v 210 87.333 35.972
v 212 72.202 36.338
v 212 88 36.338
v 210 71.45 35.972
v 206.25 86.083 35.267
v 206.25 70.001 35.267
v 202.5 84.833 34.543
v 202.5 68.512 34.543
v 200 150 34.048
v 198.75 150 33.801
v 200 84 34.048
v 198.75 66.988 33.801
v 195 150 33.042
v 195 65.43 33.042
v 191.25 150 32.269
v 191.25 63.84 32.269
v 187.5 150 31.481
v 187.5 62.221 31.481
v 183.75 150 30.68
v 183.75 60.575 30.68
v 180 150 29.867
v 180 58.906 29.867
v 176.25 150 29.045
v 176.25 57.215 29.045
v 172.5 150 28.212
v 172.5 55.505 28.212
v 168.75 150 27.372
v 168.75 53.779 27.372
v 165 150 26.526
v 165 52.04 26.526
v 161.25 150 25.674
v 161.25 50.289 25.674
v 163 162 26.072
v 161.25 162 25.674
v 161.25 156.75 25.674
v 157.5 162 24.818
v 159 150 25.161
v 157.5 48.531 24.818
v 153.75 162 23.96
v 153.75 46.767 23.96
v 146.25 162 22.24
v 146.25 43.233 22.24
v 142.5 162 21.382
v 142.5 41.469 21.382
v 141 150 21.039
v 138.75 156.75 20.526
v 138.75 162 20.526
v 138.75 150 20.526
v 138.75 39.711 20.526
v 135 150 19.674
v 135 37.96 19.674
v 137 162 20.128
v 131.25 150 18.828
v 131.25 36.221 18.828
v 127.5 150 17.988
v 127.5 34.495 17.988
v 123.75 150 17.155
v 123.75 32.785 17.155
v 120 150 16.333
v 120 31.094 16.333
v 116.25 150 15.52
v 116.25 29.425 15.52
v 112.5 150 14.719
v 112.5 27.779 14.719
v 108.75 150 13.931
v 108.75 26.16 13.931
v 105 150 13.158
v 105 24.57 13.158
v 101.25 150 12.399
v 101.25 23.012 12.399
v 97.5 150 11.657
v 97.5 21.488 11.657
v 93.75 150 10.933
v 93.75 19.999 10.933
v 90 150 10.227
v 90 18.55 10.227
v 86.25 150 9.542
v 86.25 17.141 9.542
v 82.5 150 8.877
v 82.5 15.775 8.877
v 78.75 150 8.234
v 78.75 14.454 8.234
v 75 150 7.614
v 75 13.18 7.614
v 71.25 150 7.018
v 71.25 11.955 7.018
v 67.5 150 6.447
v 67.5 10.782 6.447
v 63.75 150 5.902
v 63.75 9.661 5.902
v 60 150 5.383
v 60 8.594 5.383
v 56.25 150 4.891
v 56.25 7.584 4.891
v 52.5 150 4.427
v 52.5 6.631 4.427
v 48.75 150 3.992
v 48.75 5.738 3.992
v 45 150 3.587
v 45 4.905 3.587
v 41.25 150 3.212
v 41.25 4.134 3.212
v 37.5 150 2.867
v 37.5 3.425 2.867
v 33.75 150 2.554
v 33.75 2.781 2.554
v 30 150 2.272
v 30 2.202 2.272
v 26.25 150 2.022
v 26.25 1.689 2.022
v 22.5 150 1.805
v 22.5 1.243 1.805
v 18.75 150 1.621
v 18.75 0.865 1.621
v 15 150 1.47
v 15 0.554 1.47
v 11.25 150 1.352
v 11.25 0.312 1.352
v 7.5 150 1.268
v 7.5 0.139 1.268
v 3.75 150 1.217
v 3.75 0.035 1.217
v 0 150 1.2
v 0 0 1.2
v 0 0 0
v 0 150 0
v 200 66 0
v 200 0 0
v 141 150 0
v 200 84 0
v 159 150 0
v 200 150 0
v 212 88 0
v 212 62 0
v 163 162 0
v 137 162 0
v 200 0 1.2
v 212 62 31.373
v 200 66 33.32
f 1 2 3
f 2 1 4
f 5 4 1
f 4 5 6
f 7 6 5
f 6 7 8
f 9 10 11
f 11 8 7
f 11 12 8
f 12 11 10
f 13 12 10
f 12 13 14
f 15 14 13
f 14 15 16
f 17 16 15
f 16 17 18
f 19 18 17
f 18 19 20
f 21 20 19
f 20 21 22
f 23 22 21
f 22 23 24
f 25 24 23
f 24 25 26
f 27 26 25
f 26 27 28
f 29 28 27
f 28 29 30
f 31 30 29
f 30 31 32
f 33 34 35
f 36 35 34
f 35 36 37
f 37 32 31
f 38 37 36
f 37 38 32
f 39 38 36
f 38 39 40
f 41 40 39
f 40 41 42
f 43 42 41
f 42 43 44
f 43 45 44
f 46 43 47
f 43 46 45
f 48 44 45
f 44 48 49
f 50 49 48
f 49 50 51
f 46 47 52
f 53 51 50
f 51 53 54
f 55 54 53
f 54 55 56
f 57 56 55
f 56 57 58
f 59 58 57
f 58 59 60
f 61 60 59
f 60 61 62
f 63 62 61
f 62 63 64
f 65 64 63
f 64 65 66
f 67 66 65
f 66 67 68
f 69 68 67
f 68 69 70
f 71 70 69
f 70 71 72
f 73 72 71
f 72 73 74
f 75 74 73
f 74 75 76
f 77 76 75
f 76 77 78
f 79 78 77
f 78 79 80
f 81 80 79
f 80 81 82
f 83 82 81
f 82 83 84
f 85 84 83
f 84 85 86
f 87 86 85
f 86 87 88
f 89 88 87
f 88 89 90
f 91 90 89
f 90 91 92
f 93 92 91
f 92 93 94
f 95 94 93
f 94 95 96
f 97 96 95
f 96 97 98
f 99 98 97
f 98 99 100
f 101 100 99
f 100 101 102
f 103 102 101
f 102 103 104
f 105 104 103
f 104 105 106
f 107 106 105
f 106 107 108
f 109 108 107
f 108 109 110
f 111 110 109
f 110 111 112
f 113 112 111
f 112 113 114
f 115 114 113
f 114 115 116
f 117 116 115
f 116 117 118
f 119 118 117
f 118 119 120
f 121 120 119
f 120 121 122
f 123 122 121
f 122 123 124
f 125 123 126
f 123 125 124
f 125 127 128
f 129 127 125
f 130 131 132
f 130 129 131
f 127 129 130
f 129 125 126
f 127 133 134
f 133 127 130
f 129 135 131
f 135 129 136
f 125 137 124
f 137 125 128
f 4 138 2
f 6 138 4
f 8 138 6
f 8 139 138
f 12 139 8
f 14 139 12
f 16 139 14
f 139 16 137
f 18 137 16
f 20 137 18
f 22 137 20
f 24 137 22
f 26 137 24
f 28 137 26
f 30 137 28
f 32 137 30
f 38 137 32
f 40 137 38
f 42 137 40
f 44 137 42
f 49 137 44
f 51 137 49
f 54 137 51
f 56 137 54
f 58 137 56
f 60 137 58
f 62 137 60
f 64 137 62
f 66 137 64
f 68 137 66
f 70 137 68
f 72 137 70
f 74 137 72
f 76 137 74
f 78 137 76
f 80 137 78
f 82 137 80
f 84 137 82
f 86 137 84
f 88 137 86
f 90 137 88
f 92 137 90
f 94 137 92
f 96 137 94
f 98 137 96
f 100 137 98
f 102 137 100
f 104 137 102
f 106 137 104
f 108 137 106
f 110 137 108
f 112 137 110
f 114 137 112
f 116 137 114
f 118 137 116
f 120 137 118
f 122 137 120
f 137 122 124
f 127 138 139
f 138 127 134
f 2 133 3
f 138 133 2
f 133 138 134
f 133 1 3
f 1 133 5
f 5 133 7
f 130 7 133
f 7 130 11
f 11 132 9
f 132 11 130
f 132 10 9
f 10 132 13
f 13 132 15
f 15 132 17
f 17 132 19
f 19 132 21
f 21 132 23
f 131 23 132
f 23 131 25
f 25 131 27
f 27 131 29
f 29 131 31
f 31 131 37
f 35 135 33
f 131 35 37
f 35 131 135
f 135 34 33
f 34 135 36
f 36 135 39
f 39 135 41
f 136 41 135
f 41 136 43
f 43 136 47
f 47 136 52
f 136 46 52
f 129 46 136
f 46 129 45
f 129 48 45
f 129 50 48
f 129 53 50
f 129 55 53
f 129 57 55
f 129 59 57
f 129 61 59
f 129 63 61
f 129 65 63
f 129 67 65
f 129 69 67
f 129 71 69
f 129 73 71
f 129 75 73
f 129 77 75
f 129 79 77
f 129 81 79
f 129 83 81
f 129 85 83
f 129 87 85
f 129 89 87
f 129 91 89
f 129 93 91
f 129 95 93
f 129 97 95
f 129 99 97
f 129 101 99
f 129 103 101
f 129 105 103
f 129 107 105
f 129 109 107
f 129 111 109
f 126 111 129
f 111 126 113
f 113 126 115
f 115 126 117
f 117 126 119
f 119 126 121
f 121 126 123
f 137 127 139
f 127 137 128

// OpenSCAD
// ============================================================================
//  bikeramp.scad  --  printable coasting hill for a toddler balance bike
//
//  Generates a smooth cosine "roller" hill, auto-split into bed-sized tiles
//  that lock together with drop-in dovetails.
//
//  Render one tile:   openscad -D 'part="tile"' -D tile_i=0 -D tile_j=0 -o t.stl bikeramp.scad
//  Preview the hill:  openscad -D 'part="hill"' bikeramp.scad
//  See ./render.sh for batch export.
// ============================================================================

/* [Hill] */
shape       = "roller";  // "roller" = up and back down
                         // "drop"   = rise, flat deck, then a vertical step off
                         // "kicker" = curved launch, steepest at the lip
deck        = 150;   // drop only: flat run before the edge (mm)
hill_length = 600;   // total run, front toe to back toe (mm)
hill_width  = 300;   // riding width (mm)
hill_height = 45;    // crest height (mm)
humps       = 1;     // 1 = single hill, 2 = camel back, ...
bevel_run   = 90;    // side taper: outer this-many mm slope down to the floor. 0 = vertical sides
edge_lip    = 1.2;   // thickness at the very edges. Keeps the toe printable instead of a 0mm feather

/* [Printer] */
bed_x       = 250;   // usable bed along the run.   X1C is 256; 250 leaves margin
bed_y       = 250;   // usable bed across the width. A MK4 would be 244 x 204

/* [Joints] */
tab_depth   = 12;
tab_neck    = 18;    // width where the dovetail meets the tile (narrow)
tab_tip     = 26;    // width at the tip (wide -> locks)
fit         = 0.35;  // clearance cut into the matching socket, per side
min_tab_h   = 10;    // skip dovetails where the hill is shorter than this

/* [Ground spikes] */
spike_len     = 0;    // spike protrusion below the tile, mm. 0 = no sockets at all
socket_r      = 7.3;  // socket circumradius (12-sided blind hole)
socket_depth  = 11;
socket_roof   = 5;    // material left between socket ceiling and riding surface
socket_gon    = 12;
spike_inset   = 30;   // keep sockets clear of tile edges and their dovetails
spike_scan    = 10;   // grid the tile is searched on for its thickest point
spike_minor   = 6.5;  // thread core radius
spike_major   = 7.45; // thread crest radius -- bites into the plain socket wall
spike_pitch   = 3.0;
spike_stud    = 10;
spike_chamfer = 1.5;
spike_flange_r= 9.0;  // hex flange, circumradius. Grip it to screw the spike in
spike_flange_h= 1.5;
spike_cone_r  = 7.5;
spike_tip_r   = 0.6;

/* [Grip] */
grip_depth  = 0;     // 0 = smooth. 0.6 gives shallow traction grooves
grip_pitch  = 14;
grip_width  = 4;

/* [Output] */
part   = "tile";     // "tile" | "hill" | "mono" | "spike"
tile_i = 0;          // tile index along the run
tile_j = 0;          // tile index across the width

/* [Hidden] */
$fn = 32;
STEPS = 160;         // profile resolution
BIG   = 1000;

// ---------------------------------------------------------------- tiling ----
// Tiles carry a dovetail past their nominal pitch, so the printable span is the
// bed less one tab. Beds are often oblong, so lay the grid out both ways round
// and keep whichever needs fewer plates.
bx = max(1, bed_x - tab_depth);
by = max(1, bed_y - tab_depth);
nx_a = max(1, ceil(hill_length / bx));  ny_a = max(1, ceil(hill_width / by));
nx_b = max(1, ceil(hill_length / by));  ny_b = max(1, ceil(hill_width / bx));
turned = nx_b * ny_b < nx_a * ny_a;

nx = turned ? nx_b : nx_a;
ny = turned ? ny_b : ny_a;
px = hill_length / nx;   // tile pitch along the run
py = hill_width  / ny;   // tile pitch across the width

// ---------------------------------------------------------------- profile ---
// Three lengthwise profiles. "roller" returns to the ground; "drop" and
// "kicker" both finish at full height, so the far end is a vertical face.
function prof_x(x) =
    let (h = hill_height - edge_lip, L = hill_length)
    shape == "drop"
      ? let (rise = max(1, L - min(deck, L * 0.8)))
        (x >= rise ? hill_height
                   : edge_lip + h * 0.5 * (1 - cos(180 * min(1, max(0, x / rise)))))
  : shape == "kicker"
      ? (h < 0.01 ? edge_lip
         : let (R = (L * L + h * h) / (2 * h), xx = min(max(x, 0), L))
           edge_lip + R - sqrt(max(0, R * R - xx * xx)))
  : edge_lip + h / 2 * (1 - cos(360 * humps * x / L));

// Steepest gradient the rider meets: the lip on a kicker, the approach on a drop.
function max_slope() =
    let (h = hill_height - edge_lip, L = hill_length)
    shape == "drop"   ? atan(PI * h / (2 * max(1, L - min(deck, L * 0.8))))
  : shape == "kicker" ? (h < 0.01 ? 0
                         : let (R = (L * L + h * h) / (2 * h))
                           atan(L / max(1e-9, R - h)))
  : atan(PI * humps * h / L);

// Crosswise: flat in the middle, tapering to the floor over bevel_run.
function prof_y(y) =
    bevel_run <= 0
      ? hill_height
      : edge_lip + (hill_height - edge_lip)
          * min(1, max(0, min(y, hill_width - y) / bevel_run));

function h_at(x, y) = min(prof_x(x), prof_y(y));

// ------------------------------------------------------------ hill solid ----
module hill_solid() {
    intersection() {
        // lengthwise profile, swept across the width
        translate([0, hill_width + BIG, 0])
            rotate([90, 0, 0])
                linear_extrude(hill_width + 2 * BIG)
                    polygon(concat(
                        [[0, 0]],
                        [for (i = [0 : STEPS])
                            let (x = i * hill_length / STEPS) [x, prof_x(x)]],
                        [[hill_length, 0]]
                    ));

        // crosswise profile, swept along the run
        translate([-BIG, 0, 0])
            rotate([0, 0, 90]) rotate([90, 0, 0])
                linear_extrude(hill_length + 2 * BIG)
                    polygon(concat(
                        [[0, 0]],
                        [for (i = [0 : STEPS])
                            let (y = i * hill_width / STEPS) [y, prof_y(y)]],
                        [[hill_width, 0]]
                    ));
    }
}

// --------------------------------------------------------------- dovetail ---
// 2D dovetail pointing +X, root centred on the origin.
module dovetail_2d(grow = 0) {
    offset(delta = grow)
        polygon([[0, -tab_neck / 2],
                 [tab_depth,  -tab_tip / 2],
                 [tab_depth,   tab_tip / 2],
                 [0,  tab_neck / 2]]);
}

// How many dovetails fit on a seam of the given span, and where.
function n_tabs(span) = max(1, round(span / 120));
function tab_pos(span, k) = (k + 0.5) * span / n_tabs(span);

// Seam at constant x = xs, running in y from y0 to y0+span.
// Only keep tabs where there is enough material to make them worthwhile.
function xseam_tabs(xs, y0, span) =
    [for (k = [0 : n_tabs(span) - 1])
        let (p = y0 + tab_pos(span, k))
        if (h_at(xs, p) >= min_tab_h) p];

// Seam at constant y = ys, running in x from x0 to x0+span.
function yseam_tabs(ys, x0, span) =
    [for (k = [0 : n_tabs(span) - 1])
        let (p = x0 + tab_pos(span, k))
        if (h_at(p, ys) >= min_tab_h) p];

// ------------------------------------------------------- tile footprint -----
// Plan-view outline of tile (i,j): the rectangle, plus dovetails on its +X and
// +Y seams, minus sockets on its -X and -Y seams. Neighbours therefore always
// agree, and every tile still drops straight down into place.
module tile_footprint(i, j) {
    x0 = i * px;  x1 = (i + 1) * px;
    y0 = j * py;  y1 = (j + 1) * py;

    difference() {
        union() {
            square([px, py]);

            if (i < nx - 1)
                for (p = xseam_tabs(x1, y0, py))
                    translate([px, p - y0]) dovetail_2d();

            if (j < ny - 1)
                for (p = yseam_tabs(y1, x0, px))
                    translate([p - x0, py]) rotate(90) dovetail_2d();
        }

        if (i > 0)
            for (p = xseam_tabs(x0, y0, py))
                translate([0, p - y0]) dovetail_2d(fit);

        if (j > 0)
            for (p = yseam_tabs(y0, x0, px))
                translate([p - x0, 0]) rotate(90) dovetail_2d(fit);
    }
}

module tile_prism(i, j, inset = 0) {
    translate([i * px, j * py, -BIG / 2])
        linear_extrude(BIG)
            offset(delta = -inset)
                tile_footprint(i, j);
}

// --------------------------------------------------------- spike sockets ----
// One socket per tile, at the thickest point of the area that clears the tile
// edges and their dovetails. Tiles too thin to swallow one simply get none.
function spike_cands(i, j) =
    let (x0 = i * px + spike_inset, x1 = (i + 1) * px - spike_inset,
         y0 = j * py + spike_inset, y1 = (j + 1) * py - spike_inset)
    (x1 < x0 || y1 < y0) ? []
    : [for (a = [0 : floor((x1 - x0) / spike_scan)],
            b = [0 : floor((y1 - y0) / spike_scan)])
         let (x = x0 + a * spike_scan, y = y0 + b * spike_scan) [x, y, h_at(x, y)]];

function spike_spot(i, j) =
    let (c = spike_cands(i, j))
    len(c) == 0 ? []
    : let (best = max([for (q = c) q[2]]))
      best < socket_depth + socket_roof ? []
      : [ [for (q = c) if (q[2] >= best - 1e-9) [q[0], q[1]]][0] ];

module spike_sockets(i, j) {
    if (spike_len > 0)
        for (q = spike_spot(i, j))
            translate([q[0], q[1], -1])
                cylinder(h = socket_depth + 1, r = socket_r, $fn = socket_gon);
}

// The spike itself. Printed stud-down, tapering upward, so nothing overhangs.
// Its coarse thread forms its own groove in the plain socket and backs out again.
function thread_profile(n = 72) =
    [for (k = [0 : n - 1])
        let (a = 360 * k / n, u = k / n, t = 1 - abs(2 * u - 1),
             r = spike_minor + (spike_major - spike_minor) * t)
        [r * cos(a), r * sin(a)]];

module spike_part() {
    zf = spike_stud + spike_chamfer;
    zt = zf + spike_flange_h;
    union() {
        linear_extrude(height = spike_stud, twist = -360 * spike_stud / spike_pitch,
                       slices = ceil(spike_stud * 8), convexity = 8)
            polygon(thread_profile());
        translate([0, 0, spike_stud])
            cylinder(h = spike_chamfer, r1 = spike_major, r2 = spike_flange_r, $fn = 6);
        translate([0, 0, zf]) cylinder(h = spike_flange_h, r = spike_flange_r, $fn = 6);
        translate([0, 0, zt])
            cylinder(h = max(0.1, spike_len), r1 = spike_cone_r, r2 = spike_tip_r, $fn = 48);
    }
}

// ------------------------------------------------------------ grip combs ----
module grip_cut() {
    if (grip_depth > 0)
        intersection() {
            difference() {
                hill_solid();
                translate([0, 0, -grip_depth]) hill_solid();
            }
            for (x = [grip_pitch : grip_pitch : hill_length - grip_pitch])
                translate([x - grip_width / 2, -BIG / 2, -BIG / 2])
                    cube([grip_width, BIG, BIG]);
        }
}

// ----------------------------------------------------------------- tiles ----
module tile_solid(i, j) {
    difference() {
        intersection() { hill_solid(); tile_prism(i, j); }
        grip_cut();
        spike_sockets(i, j);
    }
}

module tile(i, j) {
    translate([-i * px, -j * py, 0])       // drop it on the origin for printing
        tile_solid(i, j);
}

// ------------------------------------------------------------------ main ----
if (part == "hill")
    for (i = [0 : nx - 1], j = [0 : ny - 1])
        translate([i * px, j * py, 0]) tile(i, j);
else if (part == "spike")
    spike_part();
else if (part == "mono")          // uncut hill, for checking the joints
    difference() { hill_solid(); grip_cut(); }
else
    tile(tile_i, tile_j);

echo(str("tiles: ", nx, " x ", ny, " = ", nx * ny,
         "   pitch ", px, " x ", py,
         "   printed extent up to ", px + tab_depth, " x ", py + tab_depth,
         "   ", shape, " max slope ", max_slope(), " deg"));
